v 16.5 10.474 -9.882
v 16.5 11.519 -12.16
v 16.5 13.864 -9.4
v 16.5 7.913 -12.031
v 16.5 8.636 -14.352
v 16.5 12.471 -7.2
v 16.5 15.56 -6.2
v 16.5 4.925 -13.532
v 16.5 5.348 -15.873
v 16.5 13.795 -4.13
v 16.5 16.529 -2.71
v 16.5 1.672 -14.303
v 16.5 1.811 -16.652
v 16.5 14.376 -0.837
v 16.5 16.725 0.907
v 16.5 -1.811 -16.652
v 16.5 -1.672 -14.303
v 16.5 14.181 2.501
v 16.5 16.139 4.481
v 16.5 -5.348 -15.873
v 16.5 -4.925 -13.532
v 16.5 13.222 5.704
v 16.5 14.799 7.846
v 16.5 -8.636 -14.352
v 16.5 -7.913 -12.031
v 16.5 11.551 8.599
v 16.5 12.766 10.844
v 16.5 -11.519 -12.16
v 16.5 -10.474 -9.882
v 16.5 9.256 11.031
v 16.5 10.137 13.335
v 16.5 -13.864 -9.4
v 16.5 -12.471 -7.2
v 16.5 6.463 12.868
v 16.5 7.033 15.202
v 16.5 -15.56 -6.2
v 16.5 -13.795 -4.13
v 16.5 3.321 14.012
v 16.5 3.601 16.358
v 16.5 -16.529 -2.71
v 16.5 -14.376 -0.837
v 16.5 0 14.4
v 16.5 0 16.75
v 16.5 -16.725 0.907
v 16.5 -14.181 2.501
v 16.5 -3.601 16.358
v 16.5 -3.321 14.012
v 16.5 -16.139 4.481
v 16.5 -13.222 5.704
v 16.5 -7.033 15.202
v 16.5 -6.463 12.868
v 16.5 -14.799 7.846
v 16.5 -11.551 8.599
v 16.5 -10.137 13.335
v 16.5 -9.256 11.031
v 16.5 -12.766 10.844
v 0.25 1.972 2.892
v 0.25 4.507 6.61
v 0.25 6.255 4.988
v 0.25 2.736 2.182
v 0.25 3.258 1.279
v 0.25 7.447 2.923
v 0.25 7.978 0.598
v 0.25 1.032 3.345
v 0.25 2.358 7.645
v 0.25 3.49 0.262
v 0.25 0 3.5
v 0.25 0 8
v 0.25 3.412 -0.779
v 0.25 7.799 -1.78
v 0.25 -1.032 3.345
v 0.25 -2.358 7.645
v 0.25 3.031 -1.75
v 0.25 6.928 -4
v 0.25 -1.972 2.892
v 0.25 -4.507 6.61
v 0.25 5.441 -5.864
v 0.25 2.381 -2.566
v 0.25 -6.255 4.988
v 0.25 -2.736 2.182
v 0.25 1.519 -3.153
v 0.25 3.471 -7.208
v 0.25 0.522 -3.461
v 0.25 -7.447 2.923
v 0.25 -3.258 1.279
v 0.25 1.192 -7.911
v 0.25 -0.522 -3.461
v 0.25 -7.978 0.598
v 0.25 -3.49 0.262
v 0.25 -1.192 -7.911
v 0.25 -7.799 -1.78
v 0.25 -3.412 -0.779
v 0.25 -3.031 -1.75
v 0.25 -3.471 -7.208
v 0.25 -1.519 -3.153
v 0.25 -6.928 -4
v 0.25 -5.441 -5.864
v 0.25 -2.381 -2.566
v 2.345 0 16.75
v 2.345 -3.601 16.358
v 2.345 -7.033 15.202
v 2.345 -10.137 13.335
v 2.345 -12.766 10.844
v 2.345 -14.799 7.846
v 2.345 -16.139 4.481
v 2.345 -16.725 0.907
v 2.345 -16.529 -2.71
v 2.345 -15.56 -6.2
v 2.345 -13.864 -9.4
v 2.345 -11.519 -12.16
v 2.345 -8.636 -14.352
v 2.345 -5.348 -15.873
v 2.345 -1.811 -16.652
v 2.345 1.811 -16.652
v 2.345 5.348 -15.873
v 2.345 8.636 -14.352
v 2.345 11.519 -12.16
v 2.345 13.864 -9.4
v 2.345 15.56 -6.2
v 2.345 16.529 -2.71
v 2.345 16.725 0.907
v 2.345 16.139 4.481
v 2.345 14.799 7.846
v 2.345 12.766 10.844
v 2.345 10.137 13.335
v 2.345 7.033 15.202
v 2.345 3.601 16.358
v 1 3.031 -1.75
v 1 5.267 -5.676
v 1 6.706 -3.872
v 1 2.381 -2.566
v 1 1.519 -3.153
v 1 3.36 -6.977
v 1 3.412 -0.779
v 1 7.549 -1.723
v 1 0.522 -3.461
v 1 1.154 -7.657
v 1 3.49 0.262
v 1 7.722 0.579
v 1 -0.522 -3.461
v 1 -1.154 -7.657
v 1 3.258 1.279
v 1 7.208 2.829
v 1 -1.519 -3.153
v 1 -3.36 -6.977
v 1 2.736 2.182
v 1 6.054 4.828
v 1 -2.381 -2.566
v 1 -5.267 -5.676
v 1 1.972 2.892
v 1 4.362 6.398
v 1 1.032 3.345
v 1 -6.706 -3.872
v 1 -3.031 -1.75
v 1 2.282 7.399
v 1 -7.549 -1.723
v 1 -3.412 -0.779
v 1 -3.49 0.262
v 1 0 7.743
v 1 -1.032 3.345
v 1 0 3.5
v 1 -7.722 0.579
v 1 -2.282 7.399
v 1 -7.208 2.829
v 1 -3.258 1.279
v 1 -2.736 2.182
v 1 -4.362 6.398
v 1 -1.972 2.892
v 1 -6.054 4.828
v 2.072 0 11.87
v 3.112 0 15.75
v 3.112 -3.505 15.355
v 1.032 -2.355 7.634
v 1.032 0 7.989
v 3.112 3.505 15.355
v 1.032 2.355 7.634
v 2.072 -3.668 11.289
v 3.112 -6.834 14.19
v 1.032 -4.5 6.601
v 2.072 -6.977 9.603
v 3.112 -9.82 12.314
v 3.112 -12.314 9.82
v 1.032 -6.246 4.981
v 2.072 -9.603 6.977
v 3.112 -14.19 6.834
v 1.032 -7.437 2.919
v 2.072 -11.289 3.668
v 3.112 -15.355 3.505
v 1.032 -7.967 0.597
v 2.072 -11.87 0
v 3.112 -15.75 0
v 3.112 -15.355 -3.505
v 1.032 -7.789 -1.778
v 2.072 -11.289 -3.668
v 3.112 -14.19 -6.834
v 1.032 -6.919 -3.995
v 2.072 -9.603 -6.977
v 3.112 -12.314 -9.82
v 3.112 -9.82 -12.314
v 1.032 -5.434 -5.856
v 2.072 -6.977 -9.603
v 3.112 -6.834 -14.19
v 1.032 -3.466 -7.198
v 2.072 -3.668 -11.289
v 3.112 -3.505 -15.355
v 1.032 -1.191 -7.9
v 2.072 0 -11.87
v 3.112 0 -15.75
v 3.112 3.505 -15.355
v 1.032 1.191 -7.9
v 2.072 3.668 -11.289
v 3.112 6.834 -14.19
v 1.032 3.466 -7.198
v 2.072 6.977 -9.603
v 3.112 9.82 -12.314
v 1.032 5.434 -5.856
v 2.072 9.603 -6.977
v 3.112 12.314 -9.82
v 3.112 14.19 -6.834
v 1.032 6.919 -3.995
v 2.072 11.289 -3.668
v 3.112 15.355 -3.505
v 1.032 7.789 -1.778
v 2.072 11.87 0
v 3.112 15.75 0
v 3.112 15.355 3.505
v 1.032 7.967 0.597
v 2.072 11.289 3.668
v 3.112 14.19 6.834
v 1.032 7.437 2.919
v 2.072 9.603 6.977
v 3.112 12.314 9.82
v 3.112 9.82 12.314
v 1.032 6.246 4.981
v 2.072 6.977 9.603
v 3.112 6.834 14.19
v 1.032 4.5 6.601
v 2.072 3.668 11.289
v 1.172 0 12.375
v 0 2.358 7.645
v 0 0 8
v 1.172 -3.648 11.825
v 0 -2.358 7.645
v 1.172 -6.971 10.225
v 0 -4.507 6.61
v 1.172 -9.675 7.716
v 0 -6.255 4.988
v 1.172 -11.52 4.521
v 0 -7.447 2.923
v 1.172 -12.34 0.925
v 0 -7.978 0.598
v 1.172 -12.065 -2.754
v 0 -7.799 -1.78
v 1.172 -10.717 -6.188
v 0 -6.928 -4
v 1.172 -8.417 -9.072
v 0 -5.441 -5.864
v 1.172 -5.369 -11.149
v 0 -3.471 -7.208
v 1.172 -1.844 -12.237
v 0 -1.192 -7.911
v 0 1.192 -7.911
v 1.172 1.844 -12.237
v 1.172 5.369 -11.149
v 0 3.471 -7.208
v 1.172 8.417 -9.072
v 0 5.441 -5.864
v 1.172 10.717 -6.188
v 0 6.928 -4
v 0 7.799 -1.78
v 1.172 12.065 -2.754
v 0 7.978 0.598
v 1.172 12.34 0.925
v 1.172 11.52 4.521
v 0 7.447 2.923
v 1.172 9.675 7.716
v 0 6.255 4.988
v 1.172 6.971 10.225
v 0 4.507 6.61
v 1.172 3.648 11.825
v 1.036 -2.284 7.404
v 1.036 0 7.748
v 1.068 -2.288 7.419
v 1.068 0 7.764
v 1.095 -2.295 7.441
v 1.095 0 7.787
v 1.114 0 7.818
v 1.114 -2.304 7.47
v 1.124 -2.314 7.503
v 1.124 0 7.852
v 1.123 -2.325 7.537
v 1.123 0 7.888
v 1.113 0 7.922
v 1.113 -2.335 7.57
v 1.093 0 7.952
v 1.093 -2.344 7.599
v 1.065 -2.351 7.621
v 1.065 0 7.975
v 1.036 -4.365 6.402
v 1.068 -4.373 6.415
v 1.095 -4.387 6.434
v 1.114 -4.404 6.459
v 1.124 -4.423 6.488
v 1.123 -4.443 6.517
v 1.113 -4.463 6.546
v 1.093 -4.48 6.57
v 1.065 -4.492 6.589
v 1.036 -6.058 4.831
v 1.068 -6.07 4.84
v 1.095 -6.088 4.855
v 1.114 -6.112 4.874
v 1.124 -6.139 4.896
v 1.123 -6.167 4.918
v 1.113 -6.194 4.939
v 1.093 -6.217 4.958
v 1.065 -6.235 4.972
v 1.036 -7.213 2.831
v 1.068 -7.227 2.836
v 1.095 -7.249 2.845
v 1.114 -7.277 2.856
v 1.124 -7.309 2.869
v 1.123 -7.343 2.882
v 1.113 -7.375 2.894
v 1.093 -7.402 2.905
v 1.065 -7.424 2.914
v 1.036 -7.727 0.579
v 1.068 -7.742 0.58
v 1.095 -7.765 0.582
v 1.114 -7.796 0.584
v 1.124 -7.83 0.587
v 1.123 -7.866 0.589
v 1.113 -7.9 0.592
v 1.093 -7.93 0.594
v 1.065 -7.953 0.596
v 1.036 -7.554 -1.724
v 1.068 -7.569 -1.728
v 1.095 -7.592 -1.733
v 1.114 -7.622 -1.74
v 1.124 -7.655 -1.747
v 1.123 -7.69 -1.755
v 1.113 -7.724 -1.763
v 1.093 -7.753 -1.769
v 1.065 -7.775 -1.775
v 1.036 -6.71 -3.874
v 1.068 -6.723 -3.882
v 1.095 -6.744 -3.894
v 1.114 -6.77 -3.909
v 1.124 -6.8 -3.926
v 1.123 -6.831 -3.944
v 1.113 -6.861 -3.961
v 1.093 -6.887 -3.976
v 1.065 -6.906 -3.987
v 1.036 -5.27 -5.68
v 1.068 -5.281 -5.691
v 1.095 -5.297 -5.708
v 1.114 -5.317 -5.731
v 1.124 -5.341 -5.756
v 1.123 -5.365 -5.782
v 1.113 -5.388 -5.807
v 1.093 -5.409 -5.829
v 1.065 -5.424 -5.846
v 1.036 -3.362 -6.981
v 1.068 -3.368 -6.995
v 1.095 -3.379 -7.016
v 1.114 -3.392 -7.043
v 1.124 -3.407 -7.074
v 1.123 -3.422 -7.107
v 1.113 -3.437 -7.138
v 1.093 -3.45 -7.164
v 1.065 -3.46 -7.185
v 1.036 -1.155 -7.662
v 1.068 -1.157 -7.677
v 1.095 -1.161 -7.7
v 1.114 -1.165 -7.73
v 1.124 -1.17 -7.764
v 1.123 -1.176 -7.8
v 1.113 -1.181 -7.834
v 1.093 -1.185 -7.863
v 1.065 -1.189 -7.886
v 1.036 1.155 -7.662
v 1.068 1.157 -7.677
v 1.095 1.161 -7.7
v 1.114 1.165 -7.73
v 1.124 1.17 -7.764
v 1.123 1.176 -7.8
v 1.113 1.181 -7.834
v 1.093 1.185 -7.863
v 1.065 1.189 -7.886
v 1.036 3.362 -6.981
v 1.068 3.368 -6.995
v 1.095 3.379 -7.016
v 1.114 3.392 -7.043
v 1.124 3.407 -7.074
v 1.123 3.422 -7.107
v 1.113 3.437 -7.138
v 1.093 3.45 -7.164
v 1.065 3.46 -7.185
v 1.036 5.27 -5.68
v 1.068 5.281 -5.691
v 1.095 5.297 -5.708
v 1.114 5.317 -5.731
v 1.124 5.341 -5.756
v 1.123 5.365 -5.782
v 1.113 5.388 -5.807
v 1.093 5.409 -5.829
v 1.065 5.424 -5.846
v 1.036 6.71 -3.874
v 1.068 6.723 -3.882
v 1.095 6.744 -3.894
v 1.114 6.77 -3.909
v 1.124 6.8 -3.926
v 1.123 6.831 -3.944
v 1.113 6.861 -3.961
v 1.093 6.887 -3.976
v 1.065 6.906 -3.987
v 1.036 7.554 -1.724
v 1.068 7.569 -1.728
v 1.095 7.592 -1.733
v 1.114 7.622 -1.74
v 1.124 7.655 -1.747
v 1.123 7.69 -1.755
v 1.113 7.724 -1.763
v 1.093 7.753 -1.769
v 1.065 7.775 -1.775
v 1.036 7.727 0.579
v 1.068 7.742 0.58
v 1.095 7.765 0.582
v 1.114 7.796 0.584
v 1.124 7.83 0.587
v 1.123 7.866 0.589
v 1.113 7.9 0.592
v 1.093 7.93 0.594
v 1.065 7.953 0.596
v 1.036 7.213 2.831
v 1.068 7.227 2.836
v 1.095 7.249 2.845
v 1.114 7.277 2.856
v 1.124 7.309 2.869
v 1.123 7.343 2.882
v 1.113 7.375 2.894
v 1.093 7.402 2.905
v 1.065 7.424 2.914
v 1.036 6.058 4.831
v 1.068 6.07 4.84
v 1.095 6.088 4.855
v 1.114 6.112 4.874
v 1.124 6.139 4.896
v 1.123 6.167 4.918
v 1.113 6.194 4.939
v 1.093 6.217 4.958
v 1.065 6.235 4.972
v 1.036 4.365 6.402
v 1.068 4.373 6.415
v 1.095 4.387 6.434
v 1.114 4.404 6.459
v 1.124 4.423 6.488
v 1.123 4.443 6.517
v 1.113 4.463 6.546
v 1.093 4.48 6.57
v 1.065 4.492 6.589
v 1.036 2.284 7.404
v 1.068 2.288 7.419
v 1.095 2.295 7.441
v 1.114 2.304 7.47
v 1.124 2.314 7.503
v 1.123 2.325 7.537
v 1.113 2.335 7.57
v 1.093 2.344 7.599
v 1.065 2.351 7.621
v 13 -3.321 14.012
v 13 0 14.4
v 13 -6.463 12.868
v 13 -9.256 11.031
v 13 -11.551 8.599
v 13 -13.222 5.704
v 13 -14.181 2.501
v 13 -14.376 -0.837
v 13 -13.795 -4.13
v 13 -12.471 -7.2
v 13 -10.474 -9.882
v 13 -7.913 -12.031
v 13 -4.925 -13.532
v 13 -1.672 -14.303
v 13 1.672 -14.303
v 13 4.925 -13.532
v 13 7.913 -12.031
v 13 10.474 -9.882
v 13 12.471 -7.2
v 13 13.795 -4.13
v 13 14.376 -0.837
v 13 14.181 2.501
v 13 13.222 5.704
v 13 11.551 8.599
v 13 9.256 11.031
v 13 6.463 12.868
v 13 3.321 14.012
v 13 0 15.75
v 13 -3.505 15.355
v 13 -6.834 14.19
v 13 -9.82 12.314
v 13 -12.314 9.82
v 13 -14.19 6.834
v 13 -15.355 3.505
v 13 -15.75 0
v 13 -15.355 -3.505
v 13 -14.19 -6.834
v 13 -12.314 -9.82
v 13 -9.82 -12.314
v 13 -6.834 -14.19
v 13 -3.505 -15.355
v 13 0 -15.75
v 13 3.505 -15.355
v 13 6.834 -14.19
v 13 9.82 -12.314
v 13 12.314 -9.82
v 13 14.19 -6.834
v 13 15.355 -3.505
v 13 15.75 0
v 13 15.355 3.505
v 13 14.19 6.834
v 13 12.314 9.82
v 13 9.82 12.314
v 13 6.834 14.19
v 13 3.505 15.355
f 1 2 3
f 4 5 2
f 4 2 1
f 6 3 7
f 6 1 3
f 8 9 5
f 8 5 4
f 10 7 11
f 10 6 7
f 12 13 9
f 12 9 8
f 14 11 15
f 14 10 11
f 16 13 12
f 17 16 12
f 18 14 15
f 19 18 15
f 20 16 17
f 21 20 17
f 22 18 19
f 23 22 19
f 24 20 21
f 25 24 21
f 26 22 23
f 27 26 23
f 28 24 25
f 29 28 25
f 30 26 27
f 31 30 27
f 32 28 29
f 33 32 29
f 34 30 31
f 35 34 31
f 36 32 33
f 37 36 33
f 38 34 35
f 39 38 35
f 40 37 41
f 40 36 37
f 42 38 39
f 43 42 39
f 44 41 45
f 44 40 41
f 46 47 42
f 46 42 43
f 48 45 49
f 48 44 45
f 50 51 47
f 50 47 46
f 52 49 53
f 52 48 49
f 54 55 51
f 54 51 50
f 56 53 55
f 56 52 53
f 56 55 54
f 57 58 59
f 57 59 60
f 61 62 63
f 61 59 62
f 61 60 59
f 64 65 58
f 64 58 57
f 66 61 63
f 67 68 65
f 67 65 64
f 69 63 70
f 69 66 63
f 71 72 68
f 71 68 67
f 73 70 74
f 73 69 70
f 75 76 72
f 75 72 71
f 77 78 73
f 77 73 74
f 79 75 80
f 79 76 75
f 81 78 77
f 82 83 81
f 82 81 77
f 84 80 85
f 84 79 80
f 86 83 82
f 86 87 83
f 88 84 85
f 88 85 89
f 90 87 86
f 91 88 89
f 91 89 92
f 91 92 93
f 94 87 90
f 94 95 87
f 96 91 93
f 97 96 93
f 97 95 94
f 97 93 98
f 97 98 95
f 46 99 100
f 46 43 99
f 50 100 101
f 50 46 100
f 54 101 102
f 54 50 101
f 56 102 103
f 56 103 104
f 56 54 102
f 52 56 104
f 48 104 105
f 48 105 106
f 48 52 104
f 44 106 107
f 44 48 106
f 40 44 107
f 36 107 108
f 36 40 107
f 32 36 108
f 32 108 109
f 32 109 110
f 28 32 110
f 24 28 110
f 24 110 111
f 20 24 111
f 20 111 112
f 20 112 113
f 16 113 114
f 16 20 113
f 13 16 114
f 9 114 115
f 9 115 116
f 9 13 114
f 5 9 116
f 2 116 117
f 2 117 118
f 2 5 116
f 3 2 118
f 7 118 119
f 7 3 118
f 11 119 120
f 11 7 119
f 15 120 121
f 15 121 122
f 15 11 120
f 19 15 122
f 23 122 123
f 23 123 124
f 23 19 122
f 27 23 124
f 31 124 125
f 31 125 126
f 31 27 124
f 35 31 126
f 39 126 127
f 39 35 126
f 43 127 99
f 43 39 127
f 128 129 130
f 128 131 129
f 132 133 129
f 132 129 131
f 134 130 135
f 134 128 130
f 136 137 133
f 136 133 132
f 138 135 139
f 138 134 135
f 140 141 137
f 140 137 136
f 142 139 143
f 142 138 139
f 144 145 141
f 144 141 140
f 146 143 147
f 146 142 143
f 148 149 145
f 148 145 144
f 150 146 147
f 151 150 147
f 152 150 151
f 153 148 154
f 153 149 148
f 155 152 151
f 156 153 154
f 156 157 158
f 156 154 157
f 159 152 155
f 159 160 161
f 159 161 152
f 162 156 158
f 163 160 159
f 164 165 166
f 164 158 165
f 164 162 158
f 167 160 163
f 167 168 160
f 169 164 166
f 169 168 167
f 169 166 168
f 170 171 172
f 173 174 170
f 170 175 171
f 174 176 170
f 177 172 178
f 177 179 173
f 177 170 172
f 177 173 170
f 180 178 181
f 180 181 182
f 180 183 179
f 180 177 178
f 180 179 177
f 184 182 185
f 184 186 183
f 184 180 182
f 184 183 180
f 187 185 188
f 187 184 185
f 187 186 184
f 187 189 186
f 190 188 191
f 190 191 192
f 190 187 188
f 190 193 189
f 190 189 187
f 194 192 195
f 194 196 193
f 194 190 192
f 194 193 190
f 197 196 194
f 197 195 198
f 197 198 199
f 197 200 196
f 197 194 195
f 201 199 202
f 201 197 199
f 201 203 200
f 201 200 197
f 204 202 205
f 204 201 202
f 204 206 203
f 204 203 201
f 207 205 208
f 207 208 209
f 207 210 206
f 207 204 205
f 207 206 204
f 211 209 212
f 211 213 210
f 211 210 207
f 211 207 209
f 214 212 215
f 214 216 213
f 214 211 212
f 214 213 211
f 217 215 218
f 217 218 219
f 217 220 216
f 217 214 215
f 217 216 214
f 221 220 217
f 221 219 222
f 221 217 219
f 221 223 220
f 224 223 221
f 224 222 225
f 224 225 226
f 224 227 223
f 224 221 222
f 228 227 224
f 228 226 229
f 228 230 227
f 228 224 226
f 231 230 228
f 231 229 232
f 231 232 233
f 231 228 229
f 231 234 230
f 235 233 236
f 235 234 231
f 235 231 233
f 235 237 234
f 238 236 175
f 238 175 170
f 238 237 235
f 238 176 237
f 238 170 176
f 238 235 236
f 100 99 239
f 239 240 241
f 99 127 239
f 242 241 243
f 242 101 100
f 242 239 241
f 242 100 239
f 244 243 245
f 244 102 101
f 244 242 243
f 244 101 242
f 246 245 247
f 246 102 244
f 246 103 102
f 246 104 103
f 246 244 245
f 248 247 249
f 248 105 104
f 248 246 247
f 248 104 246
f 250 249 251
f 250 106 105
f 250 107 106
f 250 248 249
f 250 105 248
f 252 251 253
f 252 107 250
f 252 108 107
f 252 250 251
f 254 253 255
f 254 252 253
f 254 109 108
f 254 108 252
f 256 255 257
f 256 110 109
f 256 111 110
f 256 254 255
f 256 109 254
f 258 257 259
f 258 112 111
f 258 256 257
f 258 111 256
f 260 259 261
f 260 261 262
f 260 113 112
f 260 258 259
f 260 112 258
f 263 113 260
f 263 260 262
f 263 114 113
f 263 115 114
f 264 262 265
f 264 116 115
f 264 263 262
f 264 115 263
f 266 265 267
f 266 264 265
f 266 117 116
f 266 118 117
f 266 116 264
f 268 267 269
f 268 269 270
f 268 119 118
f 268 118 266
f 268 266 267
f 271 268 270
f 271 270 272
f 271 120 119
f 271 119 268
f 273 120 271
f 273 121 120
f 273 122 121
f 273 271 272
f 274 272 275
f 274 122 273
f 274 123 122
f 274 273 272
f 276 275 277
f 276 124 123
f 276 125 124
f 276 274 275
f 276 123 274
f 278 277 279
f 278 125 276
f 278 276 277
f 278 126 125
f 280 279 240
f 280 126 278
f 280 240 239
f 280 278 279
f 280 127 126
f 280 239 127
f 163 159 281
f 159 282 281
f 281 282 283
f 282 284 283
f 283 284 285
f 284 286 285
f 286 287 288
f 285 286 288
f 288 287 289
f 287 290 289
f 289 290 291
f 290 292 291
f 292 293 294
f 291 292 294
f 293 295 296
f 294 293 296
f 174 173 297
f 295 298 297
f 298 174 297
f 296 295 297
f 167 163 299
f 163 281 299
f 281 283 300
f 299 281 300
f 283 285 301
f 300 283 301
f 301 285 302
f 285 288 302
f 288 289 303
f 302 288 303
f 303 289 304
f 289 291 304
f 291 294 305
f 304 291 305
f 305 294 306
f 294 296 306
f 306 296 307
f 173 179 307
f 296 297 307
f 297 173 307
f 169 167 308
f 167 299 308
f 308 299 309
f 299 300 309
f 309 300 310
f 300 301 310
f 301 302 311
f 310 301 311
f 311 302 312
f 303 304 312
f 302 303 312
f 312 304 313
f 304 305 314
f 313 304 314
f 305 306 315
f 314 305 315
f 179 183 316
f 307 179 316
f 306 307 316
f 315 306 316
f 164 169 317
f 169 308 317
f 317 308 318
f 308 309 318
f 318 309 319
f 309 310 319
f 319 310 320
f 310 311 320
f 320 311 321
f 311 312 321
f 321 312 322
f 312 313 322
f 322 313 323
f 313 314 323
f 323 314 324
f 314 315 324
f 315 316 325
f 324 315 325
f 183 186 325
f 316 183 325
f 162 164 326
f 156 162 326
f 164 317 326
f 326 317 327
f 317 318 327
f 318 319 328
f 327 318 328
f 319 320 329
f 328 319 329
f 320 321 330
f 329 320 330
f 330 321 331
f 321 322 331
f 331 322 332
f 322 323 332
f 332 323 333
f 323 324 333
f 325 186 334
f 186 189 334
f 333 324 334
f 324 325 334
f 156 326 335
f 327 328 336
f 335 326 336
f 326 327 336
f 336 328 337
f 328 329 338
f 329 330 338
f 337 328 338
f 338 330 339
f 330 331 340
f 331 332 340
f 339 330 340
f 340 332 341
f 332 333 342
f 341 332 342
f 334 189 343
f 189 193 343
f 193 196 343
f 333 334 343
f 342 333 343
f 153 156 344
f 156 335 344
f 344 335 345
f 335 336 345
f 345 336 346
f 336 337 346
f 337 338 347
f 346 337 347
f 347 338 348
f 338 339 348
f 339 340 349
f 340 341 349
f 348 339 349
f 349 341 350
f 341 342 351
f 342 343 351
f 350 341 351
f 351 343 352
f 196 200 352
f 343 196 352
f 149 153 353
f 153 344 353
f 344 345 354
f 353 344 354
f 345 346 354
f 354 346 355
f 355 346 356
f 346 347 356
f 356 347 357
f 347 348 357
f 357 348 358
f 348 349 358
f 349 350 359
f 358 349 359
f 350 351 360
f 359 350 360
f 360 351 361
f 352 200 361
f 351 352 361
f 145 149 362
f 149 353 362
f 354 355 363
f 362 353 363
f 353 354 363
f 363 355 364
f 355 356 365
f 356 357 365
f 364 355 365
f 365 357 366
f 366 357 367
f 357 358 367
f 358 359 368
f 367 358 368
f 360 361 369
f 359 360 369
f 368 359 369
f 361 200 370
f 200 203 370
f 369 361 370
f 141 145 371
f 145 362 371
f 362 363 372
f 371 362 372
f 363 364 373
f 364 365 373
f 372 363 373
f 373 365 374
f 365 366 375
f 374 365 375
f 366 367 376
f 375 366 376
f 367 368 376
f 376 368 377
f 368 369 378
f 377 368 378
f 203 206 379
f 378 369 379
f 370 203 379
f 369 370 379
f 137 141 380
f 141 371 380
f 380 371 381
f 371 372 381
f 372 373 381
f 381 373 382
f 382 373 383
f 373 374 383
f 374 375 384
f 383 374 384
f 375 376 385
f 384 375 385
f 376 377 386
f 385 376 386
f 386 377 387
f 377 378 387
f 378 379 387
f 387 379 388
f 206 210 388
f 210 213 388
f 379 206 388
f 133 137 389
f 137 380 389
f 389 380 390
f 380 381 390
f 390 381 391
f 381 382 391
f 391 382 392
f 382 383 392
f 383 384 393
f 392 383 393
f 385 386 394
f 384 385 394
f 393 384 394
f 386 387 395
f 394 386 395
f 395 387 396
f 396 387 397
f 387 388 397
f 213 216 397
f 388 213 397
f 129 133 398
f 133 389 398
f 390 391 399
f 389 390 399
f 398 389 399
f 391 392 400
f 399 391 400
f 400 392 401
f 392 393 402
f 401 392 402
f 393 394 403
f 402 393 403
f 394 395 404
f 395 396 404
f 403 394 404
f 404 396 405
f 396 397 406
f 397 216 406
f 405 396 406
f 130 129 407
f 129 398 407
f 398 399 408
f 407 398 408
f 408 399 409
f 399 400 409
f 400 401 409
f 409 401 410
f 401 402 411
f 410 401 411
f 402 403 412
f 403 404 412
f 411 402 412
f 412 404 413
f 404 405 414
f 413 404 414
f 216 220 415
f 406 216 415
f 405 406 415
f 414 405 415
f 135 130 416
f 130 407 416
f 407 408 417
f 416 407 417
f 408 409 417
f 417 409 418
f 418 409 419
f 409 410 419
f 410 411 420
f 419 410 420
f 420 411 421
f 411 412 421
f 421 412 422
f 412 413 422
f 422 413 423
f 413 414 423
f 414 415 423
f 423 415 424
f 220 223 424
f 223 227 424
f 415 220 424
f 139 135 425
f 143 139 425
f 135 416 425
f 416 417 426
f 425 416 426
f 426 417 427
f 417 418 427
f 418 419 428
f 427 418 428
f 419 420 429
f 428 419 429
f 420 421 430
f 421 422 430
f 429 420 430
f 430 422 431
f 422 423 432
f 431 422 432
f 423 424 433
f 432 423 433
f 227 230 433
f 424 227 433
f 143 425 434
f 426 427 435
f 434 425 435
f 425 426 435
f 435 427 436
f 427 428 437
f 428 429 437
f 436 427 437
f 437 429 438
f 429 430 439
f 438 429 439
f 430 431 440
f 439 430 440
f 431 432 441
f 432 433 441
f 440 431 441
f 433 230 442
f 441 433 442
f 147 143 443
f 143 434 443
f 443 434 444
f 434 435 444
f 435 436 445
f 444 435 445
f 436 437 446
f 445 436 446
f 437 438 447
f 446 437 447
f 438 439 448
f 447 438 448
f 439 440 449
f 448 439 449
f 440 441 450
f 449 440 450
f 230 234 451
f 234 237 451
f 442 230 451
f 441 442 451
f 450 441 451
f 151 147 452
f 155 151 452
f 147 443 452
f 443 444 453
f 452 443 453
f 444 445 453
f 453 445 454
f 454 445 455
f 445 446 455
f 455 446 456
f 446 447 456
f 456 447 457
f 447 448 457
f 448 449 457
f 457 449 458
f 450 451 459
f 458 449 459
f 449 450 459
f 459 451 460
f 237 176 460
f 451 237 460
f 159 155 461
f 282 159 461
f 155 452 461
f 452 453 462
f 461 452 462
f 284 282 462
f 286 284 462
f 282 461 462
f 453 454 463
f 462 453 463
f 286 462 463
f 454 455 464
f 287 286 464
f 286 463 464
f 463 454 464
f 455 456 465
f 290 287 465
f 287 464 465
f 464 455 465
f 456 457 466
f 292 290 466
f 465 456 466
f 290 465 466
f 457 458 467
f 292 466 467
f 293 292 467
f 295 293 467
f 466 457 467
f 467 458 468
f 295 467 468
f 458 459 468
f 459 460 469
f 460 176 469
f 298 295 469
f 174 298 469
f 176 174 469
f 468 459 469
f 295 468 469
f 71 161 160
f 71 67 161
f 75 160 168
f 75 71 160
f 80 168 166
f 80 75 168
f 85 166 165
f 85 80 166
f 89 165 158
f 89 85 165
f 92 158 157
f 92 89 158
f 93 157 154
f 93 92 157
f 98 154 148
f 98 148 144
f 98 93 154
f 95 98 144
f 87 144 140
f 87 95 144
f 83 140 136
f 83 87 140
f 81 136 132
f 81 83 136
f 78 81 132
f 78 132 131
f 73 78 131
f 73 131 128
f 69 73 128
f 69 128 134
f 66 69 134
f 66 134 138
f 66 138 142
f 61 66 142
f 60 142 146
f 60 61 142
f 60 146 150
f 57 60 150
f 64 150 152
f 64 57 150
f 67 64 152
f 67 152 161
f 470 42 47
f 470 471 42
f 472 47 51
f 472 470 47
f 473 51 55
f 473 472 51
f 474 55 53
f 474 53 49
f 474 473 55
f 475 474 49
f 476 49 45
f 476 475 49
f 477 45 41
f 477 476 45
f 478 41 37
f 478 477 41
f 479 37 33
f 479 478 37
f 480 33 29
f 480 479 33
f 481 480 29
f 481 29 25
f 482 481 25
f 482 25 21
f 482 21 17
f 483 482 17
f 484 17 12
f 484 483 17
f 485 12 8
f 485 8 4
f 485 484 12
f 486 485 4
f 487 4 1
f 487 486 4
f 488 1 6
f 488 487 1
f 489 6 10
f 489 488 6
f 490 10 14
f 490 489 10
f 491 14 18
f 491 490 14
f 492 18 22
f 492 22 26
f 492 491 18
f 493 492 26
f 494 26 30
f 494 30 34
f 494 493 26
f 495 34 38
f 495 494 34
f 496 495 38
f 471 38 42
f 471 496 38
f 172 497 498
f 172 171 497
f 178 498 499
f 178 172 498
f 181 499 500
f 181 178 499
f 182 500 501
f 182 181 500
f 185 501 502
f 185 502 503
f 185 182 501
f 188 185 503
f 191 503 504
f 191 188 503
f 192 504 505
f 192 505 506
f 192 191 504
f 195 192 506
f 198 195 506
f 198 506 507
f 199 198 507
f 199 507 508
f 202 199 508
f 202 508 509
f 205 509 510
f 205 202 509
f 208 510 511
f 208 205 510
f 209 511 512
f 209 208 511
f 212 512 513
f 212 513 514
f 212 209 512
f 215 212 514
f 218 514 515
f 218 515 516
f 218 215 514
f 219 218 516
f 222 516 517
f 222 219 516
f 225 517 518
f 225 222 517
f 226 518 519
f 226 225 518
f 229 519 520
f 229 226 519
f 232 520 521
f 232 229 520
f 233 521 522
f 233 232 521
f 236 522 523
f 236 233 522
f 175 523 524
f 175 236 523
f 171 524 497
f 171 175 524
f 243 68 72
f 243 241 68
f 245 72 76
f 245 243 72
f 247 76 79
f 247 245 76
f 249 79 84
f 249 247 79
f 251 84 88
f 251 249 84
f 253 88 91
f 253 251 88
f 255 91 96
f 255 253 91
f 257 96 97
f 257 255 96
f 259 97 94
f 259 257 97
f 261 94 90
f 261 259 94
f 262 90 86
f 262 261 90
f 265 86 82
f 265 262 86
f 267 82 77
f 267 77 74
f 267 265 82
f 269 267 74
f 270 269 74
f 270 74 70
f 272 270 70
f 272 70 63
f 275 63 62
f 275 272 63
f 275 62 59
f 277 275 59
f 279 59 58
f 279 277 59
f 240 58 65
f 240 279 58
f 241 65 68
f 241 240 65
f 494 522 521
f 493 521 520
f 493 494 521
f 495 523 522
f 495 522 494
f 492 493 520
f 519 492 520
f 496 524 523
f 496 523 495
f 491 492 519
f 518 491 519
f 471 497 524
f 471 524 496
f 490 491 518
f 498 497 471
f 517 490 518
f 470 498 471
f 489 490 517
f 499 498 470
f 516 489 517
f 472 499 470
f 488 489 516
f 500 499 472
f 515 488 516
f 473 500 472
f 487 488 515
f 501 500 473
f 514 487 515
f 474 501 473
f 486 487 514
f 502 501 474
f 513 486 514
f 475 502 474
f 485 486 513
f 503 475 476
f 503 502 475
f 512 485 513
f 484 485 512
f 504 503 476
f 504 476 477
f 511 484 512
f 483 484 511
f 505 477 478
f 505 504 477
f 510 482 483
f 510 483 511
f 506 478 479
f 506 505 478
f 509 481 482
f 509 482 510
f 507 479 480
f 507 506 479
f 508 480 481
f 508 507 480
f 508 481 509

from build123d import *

# Parameters (mm, degrees)
ESBO_O1_R = 0.125


with BuildPart() as part:
    # Esboço1 → Revolução1 (revolve)
    with BuildSketch(Plane.XY, mode=Mode.PRIVATE) as revolu_o1_sk:
        with Locations((1, 7.868347502)):
            Circle(ESBO_O1_R)
        Polygon((1, 7.868347502), (1, 3.5), (0.25, 3.5), (0.25, 8), (0, 8), (2.344555434, 16.75), (16.5, 16.75), (16.5, 14.4), (13, 14.4), (13, 15.75), (3.111882422, 15.75), align=None)
    revolve(revolu_o1_sk.sketch.rotate(Axis((0, 0, 0), (1, 0, 0)), 90), axis=Axis((0, 0, 0), (1, 0, 0)))


solid = part.part
